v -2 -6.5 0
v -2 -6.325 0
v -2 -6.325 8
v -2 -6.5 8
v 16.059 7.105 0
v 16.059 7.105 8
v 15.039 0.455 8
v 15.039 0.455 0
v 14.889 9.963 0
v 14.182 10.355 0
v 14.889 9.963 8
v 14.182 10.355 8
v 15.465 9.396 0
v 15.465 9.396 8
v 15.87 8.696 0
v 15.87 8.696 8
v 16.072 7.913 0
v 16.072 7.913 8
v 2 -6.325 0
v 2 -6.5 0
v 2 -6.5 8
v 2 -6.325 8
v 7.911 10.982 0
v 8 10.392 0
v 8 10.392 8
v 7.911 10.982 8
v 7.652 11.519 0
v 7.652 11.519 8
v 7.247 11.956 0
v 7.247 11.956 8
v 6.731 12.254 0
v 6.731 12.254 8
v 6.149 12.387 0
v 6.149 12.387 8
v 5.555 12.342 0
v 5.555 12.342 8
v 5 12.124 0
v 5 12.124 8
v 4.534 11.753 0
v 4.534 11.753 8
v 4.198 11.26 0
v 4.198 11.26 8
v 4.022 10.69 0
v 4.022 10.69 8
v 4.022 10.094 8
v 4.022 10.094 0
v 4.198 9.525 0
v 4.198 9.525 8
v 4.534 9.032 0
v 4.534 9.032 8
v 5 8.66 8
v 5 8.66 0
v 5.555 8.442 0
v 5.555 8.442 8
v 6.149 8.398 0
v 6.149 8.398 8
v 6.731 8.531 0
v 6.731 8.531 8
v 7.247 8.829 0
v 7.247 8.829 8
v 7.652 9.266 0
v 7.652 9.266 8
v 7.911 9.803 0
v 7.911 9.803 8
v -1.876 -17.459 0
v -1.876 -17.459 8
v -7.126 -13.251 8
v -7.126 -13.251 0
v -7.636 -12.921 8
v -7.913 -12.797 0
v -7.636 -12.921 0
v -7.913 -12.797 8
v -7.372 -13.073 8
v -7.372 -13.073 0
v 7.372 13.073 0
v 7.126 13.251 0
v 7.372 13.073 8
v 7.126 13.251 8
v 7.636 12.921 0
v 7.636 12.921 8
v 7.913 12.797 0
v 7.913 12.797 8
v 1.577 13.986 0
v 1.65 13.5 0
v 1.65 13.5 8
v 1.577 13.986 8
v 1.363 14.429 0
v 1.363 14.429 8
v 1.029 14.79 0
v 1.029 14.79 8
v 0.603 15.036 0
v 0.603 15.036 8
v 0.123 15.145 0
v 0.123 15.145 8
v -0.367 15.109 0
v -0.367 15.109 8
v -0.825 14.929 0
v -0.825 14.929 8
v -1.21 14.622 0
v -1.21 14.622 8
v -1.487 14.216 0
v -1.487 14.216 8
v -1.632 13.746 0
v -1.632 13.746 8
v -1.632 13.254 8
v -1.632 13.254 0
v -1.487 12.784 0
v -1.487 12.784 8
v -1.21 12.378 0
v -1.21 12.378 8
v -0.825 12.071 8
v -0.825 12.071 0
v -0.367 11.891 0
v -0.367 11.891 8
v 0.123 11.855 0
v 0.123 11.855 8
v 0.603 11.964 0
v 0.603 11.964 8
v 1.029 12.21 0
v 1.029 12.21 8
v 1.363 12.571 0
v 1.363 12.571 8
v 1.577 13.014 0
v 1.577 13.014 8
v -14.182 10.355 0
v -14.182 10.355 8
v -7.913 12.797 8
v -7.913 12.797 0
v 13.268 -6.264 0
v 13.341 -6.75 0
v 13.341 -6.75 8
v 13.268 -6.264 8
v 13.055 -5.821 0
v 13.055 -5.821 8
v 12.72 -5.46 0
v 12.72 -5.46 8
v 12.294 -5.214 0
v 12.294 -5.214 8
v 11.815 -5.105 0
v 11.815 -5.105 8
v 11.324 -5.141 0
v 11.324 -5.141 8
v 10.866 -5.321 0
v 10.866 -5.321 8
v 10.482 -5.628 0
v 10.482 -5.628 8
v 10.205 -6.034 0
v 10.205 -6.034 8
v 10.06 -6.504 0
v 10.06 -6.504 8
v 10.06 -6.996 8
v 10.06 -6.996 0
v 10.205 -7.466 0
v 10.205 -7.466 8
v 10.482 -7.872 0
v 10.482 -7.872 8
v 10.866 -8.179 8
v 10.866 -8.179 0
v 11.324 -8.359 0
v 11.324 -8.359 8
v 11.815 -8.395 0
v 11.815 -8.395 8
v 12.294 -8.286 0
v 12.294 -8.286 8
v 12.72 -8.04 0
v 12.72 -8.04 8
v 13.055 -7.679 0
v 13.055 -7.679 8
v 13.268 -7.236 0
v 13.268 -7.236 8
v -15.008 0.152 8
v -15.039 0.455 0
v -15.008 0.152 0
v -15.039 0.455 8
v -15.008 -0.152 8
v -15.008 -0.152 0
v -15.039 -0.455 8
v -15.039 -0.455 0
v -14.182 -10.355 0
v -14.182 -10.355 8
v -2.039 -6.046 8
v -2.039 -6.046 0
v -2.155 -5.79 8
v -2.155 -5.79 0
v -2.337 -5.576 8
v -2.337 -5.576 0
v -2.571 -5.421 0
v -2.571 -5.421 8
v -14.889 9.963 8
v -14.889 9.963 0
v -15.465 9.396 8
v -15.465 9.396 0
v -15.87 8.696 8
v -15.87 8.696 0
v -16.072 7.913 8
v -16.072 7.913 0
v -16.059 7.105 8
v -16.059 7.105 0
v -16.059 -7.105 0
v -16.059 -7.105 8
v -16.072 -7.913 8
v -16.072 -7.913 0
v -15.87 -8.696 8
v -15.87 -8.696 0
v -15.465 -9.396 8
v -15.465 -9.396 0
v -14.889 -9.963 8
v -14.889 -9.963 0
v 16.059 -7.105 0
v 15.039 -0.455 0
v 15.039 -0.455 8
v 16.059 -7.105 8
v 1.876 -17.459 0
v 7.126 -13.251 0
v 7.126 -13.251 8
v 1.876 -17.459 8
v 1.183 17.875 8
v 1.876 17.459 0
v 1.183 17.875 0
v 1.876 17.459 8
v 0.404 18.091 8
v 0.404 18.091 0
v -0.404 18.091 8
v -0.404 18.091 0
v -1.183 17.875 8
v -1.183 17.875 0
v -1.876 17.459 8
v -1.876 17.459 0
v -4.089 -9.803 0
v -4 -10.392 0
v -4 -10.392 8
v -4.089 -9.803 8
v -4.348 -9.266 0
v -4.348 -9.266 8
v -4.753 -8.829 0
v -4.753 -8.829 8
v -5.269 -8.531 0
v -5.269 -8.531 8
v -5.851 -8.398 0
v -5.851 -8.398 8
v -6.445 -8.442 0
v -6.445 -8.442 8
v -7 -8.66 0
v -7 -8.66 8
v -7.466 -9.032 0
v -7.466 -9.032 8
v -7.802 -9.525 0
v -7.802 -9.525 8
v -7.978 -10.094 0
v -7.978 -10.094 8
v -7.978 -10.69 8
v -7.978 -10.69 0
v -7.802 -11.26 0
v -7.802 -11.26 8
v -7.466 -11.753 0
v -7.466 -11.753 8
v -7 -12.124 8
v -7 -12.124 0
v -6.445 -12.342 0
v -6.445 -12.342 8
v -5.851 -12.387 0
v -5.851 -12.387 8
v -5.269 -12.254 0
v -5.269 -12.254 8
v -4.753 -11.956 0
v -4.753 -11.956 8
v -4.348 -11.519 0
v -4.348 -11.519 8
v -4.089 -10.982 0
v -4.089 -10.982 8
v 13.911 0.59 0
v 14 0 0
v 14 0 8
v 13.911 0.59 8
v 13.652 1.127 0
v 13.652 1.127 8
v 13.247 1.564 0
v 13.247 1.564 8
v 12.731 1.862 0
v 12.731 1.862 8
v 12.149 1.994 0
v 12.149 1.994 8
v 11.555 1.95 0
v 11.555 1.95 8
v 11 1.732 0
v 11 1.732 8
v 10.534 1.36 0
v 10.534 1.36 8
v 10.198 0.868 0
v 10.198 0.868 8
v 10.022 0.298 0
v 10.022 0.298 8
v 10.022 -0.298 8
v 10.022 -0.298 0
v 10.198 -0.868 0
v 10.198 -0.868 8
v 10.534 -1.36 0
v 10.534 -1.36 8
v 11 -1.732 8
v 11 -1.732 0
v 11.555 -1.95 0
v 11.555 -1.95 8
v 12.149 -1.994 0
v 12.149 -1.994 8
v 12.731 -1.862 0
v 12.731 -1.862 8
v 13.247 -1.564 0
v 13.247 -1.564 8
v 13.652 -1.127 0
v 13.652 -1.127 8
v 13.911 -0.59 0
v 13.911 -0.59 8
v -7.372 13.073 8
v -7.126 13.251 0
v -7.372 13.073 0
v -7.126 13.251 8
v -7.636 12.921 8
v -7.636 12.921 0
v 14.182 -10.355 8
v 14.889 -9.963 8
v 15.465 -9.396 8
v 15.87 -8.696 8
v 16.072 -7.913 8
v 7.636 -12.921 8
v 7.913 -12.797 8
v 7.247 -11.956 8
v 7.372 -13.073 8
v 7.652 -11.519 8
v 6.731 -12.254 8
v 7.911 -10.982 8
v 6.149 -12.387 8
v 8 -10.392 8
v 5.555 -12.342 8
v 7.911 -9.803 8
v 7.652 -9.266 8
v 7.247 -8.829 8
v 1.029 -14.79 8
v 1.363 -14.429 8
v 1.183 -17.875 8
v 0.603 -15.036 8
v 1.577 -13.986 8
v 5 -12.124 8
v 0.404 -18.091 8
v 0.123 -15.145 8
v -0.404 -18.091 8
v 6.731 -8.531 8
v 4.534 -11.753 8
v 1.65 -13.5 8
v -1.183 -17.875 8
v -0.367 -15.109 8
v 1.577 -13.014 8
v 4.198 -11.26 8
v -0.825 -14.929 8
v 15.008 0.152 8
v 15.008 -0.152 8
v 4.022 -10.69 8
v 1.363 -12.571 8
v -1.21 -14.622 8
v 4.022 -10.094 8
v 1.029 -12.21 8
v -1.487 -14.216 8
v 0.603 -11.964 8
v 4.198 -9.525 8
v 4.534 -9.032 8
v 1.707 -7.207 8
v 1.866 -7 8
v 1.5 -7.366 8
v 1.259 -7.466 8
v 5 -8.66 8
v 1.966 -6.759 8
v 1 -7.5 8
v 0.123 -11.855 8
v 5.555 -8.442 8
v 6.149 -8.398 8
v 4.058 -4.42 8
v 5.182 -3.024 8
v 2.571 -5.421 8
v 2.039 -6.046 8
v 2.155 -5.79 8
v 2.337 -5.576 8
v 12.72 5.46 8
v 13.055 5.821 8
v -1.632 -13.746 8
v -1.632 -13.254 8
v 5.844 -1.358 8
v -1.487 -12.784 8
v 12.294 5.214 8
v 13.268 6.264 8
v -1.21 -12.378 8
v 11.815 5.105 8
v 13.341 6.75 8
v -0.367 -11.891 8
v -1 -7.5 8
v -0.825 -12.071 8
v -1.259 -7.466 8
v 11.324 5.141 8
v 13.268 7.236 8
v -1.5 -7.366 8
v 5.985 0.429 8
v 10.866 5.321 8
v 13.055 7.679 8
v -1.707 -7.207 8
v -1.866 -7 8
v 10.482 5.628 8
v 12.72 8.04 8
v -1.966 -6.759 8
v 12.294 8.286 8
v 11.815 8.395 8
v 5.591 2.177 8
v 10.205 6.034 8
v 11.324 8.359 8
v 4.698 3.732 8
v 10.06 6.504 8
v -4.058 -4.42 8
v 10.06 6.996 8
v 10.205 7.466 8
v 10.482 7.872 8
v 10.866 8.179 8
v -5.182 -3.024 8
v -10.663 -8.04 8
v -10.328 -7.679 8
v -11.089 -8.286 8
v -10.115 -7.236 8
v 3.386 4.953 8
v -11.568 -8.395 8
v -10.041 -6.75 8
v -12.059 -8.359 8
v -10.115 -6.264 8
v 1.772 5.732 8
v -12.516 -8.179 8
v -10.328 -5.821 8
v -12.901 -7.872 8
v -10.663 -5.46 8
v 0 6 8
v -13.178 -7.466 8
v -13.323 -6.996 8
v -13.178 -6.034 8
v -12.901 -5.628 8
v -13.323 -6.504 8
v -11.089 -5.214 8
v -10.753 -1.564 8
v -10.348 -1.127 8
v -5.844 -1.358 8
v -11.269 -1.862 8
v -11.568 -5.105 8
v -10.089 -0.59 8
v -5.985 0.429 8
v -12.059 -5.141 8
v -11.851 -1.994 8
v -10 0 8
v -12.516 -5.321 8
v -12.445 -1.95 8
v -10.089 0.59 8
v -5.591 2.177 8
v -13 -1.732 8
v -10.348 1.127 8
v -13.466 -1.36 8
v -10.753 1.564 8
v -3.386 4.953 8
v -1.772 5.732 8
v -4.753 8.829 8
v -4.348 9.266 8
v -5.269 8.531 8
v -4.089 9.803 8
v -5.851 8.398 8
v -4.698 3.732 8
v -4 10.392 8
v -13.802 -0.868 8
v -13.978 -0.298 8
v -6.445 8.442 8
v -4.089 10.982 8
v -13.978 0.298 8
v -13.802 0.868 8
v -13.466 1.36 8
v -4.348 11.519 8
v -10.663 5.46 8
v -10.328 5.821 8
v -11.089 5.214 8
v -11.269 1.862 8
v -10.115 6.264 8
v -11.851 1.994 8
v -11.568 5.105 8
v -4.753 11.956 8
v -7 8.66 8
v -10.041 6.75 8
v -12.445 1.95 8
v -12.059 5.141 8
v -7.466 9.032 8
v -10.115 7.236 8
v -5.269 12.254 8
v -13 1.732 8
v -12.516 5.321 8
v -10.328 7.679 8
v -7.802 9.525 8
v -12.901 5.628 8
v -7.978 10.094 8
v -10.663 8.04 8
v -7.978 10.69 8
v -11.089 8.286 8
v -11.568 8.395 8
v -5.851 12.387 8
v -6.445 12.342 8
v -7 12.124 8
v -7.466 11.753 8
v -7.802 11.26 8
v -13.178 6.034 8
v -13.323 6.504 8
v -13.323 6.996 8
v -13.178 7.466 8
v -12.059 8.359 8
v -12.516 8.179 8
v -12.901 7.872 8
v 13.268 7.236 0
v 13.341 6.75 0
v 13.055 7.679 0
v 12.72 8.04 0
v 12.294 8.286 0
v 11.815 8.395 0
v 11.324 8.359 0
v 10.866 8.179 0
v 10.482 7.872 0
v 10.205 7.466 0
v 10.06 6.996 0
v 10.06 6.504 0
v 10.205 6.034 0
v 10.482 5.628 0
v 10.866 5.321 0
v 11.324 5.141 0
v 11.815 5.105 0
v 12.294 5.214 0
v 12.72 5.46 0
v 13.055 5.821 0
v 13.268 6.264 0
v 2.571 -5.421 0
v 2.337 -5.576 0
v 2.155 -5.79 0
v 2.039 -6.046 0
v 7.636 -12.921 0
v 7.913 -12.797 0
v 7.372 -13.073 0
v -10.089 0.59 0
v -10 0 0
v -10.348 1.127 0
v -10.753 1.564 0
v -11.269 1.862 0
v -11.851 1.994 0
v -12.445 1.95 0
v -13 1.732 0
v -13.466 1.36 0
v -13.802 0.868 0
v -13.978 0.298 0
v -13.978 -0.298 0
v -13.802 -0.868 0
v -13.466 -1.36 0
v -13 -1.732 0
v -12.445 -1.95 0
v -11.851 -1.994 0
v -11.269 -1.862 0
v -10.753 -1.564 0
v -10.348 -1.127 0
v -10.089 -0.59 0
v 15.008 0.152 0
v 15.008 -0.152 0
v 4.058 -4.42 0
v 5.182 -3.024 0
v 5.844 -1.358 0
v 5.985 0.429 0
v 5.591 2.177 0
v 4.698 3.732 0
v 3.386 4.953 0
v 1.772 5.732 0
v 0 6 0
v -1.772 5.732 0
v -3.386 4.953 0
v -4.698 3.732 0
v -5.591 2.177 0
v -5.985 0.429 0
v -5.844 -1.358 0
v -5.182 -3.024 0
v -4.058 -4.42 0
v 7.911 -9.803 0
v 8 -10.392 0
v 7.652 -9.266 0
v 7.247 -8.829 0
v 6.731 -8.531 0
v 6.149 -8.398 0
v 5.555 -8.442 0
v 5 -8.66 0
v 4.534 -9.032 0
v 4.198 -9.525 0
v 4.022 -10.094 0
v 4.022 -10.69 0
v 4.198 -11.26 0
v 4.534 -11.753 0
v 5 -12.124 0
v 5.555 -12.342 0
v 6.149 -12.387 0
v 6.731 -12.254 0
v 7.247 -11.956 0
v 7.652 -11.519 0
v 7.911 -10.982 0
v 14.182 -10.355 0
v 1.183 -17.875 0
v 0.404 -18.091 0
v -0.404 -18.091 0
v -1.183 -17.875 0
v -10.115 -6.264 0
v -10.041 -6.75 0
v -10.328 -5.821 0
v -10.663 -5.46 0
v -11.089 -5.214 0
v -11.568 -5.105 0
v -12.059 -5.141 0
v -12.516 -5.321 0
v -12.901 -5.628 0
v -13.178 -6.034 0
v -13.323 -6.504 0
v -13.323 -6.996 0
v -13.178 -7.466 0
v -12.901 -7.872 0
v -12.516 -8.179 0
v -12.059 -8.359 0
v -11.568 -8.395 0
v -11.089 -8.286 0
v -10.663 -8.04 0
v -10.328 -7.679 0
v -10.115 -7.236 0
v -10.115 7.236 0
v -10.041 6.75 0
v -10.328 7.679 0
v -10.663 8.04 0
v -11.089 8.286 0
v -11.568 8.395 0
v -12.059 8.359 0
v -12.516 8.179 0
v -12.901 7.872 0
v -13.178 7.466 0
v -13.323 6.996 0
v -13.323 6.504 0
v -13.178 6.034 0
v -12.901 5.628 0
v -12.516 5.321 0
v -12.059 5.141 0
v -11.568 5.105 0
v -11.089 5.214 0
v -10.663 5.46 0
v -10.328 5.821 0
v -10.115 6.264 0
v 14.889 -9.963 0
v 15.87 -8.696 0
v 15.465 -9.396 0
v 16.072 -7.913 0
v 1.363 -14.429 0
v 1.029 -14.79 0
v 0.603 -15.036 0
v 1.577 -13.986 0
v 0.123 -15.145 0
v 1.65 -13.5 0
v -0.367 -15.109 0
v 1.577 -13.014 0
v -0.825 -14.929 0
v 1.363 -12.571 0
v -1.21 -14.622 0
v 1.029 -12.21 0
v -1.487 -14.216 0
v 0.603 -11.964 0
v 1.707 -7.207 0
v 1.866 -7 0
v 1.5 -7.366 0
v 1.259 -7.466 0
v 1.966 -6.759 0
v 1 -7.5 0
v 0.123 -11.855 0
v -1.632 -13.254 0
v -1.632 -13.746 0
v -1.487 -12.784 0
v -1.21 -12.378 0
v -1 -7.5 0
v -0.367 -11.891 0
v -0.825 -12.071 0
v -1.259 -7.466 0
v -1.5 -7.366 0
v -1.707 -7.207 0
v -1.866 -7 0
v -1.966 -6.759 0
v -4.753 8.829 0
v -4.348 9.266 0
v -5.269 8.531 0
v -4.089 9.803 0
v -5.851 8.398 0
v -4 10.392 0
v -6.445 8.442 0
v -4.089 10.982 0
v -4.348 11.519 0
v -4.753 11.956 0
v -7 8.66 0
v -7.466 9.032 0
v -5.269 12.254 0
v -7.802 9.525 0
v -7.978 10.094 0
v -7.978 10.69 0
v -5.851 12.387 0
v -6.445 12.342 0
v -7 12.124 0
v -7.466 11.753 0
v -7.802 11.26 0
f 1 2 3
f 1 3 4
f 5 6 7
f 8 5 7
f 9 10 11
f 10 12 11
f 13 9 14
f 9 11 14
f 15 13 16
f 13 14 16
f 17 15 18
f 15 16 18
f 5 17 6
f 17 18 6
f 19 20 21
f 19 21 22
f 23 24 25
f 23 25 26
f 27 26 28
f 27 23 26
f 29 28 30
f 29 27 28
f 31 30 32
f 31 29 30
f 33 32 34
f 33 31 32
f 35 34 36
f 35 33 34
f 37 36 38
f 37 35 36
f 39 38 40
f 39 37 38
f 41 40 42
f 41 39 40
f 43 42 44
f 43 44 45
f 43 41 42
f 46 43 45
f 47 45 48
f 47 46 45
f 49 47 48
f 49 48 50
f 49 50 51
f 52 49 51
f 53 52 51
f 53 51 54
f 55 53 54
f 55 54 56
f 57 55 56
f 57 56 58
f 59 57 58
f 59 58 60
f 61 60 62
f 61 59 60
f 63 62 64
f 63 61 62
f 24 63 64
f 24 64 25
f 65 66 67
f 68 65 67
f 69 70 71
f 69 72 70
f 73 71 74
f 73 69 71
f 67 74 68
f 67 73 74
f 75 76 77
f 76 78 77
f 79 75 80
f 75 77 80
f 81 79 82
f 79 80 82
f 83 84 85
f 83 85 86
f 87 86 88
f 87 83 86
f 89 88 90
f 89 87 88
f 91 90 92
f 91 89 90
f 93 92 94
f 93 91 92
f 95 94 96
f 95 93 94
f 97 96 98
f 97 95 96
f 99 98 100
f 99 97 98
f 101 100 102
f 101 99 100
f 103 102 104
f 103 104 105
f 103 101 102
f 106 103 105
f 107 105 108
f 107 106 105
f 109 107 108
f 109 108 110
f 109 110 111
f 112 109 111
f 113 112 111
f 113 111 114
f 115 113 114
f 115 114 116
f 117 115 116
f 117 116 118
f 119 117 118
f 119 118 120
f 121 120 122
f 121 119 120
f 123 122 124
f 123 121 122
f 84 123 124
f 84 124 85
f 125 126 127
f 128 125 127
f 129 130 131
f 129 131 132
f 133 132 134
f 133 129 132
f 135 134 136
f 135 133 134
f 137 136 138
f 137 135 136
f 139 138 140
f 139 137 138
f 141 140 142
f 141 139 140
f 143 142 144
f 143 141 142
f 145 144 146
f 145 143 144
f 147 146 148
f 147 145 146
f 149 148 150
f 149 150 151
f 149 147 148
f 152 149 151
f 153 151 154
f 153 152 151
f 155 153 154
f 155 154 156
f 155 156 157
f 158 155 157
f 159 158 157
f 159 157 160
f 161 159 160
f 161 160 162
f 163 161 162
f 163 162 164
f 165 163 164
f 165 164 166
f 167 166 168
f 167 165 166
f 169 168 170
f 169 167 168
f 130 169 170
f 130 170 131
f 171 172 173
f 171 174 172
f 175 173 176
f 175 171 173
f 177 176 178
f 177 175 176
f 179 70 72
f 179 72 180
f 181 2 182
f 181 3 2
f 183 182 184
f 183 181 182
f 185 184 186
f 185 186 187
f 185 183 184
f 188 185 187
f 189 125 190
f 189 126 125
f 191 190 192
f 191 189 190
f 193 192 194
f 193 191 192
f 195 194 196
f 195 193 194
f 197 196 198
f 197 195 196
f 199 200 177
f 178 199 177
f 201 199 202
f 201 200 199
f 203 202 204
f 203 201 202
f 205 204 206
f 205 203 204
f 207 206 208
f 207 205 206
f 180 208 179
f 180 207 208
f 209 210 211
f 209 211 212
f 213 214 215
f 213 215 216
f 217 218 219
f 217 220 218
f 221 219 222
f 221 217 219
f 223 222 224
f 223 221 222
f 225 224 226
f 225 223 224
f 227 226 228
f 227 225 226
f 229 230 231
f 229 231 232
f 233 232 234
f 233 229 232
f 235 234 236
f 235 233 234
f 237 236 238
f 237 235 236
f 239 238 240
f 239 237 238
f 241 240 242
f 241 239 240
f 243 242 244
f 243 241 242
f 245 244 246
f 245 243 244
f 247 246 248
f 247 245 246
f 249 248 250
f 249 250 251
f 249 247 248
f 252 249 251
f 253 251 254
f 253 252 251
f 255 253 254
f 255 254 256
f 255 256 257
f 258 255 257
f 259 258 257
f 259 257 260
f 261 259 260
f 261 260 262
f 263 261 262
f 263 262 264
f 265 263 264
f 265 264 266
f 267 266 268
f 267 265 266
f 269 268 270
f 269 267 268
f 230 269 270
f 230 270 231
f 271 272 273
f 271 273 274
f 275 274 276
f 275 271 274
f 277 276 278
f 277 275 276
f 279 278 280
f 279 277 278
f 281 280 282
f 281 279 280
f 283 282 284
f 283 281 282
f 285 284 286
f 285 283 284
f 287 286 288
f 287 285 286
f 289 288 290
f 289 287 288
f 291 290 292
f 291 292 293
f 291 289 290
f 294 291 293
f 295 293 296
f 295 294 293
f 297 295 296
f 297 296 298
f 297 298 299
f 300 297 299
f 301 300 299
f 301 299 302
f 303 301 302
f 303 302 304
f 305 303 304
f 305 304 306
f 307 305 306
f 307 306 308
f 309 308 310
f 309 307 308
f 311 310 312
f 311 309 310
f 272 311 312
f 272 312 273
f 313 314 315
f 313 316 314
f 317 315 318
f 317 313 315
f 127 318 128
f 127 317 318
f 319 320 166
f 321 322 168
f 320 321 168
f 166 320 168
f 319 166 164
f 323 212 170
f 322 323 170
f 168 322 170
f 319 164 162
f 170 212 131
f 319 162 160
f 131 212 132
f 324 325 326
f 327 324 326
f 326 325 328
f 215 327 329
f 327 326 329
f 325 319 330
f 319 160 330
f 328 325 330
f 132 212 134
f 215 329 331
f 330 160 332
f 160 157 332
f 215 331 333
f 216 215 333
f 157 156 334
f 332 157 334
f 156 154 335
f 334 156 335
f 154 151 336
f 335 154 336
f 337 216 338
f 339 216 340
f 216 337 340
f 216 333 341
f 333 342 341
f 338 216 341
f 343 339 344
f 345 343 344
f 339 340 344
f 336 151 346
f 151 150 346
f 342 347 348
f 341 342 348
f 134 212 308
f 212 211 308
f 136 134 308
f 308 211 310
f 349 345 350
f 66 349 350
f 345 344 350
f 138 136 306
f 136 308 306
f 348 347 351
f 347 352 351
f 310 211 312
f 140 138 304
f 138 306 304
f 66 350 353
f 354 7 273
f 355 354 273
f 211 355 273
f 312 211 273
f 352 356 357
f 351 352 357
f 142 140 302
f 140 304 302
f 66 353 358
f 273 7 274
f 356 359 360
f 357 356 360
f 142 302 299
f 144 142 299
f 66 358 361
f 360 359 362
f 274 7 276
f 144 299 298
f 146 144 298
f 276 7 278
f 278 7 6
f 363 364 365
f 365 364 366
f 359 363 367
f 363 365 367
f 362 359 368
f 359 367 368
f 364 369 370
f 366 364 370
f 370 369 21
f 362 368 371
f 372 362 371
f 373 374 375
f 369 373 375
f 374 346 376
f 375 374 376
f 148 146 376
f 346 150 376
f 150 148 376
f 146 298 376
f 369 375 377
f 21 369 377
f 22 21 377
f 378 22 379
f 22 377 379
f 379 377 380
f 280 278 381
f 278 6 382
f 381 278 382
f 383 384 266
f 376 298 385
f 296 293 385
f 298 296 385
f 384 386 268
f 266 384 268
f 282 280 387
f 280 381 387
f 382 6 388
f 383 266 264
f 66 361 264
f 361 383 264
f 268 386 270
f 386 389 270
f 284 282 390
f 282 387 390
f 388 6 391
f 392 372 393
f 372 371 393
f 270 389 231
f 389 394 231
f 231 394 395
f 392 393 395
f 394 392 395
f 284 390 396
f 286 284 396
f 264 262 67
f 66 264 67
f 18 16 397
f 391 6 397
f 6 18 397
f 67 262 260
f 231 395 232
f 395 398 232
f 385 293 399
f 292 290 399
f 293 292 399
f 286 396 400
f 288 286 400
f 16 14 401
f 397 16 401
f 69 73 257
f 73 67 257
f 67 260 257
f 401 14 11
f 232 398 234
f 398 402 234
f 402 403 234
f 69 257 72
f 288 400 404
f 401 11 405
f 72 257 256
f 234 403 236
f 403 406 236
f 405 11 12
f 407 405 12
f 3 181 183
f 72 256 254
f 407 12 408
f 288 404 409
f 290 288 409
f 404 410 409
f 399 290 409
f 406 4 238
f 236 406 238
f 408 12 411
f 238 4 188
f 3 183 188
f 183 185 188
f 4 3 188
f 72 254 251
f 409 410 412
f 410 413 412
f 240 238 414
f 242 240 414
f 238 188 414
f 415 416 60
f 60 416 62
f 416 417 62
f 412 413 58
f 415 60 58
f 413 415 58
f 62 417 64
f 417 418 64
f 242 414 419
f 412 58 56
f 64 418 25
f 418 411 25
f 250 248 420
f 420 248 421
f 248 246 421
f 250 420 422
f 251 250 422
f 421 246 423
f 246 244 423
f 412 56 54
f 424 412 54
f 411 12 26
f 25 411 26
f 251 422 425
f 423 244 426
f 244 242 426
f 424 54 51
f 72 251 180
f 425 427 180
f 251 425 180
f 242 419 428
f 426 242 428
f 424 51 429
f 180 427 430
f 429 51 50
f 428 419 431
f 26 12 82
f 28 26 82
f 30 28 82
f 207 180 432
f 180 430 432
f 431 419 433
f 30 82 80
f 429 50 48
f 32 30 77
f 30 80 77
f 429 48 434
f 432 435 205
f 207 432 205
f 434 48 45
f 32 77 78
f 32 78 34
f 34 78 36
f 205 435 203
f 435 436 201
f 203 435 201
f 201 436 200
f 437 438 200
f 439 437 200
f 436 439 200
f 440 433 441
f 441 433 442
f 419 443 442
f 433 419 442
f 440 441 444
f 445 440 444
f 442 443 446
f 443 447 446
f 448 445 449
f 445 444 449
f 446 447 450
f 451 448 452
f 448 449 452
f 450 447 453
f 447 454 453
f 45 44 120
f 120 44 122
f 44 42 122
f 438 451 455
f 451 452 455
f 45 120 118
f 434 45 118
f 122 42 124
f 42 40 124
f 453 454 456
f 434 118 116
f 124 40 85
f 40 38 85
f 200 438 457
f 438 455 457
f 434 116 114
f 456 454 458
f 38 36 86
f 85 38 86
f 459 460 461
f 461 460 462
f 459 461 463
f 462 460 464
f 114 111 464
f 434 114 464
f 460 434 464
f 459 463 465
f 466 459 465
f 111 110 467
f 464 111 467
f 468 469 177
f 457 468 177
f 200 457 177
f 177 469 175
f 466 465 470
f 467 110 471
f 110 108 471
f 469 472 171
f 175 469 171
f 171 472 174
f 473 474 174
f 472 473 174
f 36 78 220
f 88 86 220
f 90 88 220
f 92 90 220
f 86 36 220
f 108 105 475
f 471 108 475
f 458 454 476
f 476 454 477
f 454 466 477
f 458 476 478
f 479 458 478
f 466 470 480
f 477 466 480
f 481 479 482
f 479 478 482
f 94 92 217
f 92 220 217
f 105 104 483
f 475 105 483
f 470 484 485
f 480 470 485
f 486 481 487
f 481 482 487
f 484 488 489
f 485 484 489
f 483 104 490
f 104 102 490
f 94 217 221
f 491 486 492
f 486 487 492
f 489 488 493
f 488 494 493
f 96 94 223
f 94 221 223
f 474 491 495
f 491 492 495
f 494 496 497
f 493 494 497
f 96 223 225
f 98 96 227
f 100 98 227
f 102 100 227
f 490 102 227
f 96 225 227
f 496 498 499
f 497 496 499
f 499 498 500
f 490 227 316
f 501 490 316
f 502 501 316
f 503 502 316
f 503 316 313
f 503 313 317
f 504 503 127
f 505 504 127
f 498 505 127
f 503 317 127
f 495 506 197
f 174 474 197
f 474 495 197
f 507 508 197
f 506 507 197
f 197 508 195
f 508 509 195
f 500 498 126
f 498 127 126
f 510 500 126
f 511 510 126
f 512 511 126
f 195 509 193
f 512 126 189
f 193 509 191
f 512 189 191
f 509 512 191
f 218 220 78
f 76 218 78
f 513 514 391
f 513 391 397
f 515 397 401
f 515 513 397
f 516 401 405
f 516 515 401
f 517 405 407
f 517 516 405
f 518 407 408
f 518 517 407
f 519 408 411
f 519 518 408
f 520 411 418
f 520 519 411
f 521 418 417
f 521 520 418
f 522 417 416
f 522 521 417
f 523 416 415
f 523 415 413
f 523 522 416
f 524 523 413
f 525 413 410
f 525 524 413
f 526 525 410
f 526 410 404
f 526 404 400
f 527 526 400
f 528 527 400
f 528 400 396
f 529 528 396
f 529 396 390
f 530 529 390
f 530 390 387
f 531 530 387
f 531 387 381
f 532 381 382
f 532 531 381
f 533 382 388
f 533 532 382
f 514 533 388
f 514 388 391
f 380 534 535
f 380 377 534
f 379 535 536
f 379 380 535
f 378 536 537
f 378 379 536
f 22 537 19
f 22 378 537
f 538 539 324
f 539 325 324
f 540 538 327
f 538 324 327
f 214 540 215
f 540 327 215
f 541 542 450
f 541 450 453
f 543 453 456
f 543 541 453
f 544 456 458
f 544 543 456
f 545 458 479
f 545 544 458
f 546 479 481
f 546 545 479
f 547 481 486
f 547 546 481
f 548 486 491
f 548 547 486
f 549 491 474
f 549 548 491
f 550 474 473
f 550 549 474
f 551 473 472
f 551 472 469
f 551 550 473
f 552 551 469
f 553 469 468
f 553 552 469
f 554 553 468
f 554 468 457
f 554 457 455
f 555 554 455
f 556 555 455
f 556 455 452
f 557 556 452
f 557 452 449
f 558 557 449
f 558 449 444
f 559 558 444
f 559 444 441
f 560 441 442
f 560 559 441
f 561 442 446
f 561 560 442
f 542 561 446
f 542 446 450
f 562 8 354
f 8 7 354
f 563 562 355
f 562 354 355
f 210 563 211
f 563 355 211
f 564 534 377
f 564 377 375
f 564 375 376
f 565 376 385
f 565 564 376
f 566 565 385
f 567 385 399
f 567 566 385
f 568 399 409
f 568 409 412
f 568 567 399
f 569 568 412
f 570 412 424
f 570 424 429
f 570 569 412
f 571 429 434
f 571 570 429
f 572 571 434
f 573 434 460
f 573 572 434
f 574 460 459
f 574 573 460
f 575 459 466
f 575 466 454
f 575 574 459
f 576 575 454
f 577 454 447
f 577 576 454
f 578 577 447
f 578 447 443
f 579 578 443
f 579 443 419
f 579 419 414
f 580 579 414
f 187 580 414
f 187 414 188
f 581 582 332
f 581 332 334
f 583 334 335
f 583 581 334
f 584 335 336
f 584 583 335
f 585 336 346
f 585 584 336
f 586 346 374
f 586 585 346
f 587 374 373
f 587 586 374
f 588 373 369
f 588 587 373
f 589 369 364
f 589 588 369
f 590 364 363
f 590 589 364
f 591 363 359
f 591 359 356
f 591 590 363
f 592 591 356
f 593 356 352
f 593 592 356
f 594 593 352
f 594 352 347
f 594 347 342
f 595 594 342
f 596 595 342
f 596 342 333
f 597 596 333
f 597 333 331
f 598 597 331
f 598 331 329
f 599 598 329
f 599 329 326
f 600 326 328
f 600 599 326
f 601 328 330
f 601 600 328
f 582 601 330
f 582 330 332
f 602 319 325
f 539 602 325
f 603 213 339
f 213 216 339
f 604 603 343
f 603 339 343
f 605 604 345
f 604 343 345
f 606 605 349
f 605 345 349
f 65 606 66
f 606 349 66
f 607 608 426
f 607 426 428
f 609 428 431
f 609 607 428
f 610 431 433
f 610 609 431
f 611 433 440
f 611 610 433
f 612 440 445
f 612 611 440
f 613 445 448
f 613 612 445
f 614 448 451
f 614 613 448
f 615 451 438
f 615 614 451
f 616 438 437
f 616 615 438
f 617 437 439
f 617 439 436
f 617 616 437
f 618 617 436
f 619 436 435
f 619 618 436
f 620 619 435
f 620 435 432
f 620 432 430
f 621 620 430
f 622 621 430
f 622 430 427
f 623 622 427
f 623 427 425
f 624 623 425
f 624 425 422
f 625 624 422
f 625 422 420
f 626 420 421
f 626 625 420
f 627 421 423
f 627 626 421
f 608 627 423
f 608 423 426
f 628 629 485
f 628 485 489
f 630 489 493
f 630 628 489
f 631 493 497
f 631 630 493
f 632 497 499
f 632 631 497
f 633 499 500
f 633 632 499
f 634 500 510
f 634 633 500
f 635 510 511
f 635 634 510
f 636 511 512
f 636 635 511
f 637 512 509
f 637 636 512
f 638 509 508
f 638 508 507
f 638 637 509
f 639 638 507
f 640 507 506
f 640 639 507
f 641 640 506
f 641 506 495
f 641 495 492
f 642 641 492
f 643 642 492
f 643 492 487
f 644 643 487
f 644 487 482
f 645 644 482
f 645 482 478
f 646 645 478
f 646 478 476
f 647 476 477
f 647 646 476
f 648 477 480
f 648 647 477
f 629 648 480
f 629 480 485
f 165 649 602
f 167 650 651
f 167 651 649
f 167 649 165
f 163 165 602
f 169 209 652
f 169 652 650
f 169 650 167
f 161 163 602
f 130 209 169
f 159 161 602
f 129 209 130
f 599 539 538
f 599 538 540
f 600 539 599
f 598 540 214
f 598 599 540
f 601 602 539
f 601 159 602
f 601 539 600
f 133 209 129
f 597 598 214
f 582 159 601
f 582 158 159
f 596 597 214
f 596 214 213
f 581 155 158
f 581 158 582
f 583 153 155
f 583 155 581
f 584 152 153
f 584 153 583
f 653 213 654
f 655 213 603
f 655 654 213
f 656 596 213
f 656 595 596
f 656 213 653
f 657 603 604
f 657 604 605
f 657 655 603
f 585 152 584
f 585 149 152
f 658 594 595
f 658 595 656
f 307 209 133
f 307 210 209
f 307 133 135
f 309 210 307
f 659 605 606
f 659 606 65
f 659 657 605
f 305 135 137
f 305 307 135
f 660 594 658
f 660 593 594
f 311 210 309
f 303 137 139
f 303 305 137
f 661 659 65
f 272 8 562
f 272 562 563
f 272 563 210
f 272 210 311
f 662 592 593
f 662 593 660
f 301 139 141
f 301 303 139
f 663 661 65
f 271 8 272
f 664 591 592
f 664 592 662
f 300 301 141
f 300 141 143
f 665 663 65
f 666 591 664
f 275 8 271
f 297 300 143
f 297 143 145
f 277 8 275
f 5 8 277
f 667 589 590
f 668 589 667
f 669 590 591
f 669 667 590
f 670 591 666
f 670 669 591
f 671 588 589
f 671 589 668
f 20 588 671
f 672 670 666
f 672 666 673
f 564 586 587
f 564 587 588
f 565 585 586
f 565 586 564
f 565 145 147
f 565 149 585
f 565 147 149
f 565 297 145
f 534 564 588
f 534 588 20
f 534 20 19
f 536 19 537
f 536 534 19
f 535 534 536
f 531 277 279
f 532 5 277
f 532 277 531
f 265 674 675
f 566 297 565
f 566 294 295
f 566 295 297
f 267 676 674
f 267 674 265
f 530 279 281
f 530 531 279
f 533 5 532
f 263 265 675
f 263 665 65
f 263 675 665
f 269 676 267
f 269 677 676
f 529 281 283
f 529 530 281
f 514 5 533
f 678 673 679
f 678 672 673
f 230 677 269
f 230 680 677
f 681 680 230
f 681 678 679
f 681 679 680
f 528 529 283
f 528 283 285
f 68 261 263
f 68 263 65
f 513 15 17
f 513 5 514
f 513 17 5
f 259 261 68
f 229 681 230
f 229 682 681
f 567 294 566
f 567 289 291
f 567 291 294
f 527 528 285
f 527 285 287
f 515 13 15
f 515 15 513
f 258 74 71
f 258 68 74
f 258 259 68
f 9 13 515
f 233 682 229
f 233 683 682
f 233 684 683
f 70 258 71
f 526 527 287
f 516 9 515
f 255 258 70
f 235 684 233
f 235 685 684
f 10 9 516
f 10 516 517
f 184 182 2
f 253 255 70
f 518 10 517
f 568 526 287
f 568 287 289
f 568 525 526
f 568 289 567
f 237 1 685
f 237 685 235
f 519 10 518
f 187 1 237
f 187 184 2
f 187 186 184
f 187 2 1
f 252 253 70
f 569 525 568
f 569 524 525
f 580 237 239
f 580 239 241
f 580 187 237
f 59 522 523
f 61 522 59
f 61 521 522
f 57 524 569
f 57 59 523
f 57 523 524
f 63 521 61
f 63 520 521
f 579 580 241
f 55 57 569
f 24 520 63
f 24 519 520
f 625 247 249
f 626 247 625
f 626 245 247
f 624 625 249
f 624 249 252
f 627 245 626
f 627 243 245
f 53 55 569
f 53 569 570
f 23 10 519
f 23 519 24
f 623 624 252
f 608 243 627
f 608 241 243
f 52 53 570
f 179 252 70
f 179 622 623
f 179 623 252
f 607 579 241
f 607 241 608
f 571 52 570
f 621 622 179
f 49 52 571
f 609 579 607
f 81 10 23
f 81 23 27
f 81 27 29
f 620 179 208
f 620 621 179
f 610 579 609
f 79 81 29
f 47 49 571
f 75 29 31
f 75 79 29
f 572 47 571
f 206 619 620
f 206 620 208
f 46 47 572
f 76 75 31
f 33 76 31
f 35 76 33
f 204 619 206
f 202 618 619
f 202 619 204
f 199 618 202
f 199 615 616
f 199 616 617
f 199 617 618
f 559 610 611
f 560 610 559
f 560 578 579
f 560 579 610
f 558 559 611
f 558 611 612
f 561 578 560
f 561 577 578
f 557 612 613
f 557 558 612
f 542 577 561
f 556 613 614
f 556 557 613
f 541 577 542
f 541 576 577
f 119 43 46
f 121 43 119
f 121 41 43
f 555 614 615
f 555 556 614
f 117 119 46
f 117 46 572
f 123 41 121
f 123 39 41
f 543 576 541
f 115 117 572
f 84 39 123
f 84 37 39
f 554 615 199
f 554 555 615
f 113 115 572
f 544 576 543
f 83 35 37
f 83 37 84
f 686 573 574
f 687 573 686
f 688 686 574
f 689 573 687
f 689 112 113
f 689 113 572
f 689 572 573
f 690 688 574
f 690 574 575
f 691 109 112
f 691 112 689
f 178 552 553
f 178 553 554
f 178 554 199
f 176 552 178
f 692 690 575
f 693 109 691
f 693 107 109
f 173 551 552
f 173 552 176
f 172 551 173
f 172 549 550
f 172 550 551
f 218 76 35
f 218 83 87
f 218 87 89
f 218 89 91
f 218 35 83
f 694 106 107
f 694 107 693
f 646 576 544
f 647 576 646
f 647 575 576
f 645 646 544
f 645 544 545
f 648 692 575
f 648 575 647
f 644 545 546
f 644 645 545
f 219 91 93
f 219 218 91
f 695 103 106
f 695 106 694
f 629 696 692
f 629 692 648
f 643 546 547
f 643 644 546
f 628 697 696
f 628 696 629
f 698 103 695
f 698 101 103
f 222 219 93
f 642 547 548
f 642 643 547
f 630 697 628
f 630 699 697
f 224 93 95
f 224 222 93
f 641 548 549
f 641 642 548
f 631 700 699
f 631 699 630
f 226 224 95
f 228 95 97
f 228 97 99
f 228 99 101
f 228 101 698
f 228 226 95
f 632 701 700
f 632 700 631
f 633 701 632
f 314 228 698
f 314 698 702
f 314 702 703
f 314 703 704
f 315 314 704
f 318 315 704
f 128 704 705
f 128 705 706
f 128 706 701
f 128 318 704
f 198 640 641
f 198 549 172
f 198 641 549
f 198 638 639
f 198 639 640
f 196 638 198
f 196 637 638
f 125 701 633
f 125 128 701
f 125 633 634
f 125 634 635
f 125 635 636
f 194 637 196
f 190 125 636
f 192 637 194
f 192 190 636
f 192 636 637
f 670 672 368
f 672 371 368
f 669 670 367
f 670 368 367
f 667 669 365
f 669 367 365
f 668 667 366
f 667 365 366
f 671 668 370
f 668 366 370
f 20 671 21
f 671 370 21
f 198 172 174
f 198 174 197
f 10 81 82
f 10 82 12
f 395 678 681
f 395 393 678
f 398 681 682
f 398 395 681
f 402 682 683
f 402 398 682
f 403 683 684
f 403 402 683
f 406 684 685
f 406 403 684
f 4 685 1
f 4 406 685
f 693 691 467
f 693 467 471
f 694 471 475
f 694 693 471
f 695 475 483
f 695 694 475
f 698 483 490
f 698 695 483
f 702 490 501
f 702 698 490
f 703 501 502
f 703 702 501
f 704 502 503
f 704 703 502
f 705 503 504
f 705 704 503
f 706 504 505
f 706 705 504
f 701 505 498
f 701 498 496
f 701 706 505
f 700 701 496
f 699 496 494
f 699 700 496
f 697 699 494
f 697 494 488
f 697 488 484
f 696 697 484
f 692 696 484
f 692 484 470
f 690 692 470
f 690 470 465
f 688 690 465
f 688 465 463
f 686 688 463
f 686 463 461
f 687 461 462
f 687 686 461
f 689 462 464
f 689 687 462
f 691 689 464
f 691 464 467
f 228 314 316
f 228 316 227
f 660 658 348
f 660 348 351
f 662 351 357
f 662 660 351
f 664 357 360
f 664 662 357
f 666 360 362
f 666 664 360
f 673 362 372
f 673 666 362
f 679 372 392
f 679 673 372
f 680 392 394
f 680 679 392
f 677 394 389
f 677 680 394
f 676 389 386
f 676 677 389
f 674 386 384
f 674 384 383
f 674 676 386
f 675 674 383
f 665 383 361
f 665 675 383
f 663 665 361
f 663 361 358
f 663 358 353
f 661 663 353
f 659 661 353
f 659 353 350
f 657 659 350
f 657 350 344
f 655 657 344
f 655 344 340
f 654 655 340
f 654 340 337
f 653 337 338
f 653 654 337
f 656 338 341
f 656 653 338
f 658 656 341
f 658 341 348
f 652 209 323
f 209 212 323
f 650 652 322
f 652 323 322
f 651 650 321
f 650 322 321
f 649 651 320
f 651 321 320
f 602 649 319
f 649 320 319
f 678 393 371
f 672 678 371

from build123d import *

# Parameters (mm, degrees)
SKETCH_2_R      = 1.65
SKETCH_2_R_2    = 2
EXTRUDE_1_DEPTH = 8
FILLET_1_R      = 3
FILLET_2_R      = 1


with BuildPart() as part:
    # 草图2 → 凸台-拉伸1 (new body)
    with BuildSketch(Plane.XY):
        Polygon((0, 18.963672443), (7.484579775, 12.963672443), (16.423022085, 9.481836222), (14.96915955, 0), (16.423022085, -9.481836222), (7.484579775, -12.963672443), (0, -18.963672443), (-7.484579775, -12.963672443), (-16.423022085, -9.481836222), (-14.96915955, 0), (-16.423022085, 9.481836222), (-7.484579775, 12.963672443), align=None)
        with Locations((0, 13.5)):
            Circle(SKETCH_2_R, mode=Mode.SUBTRACT)
        with Locations((11.691342951, 6.75)):
            Circle(SKETCH_2_R, mode=Mode.SUBTRACT)
        with Locations((11.691342951, -6.75)):
            Circle(SKETCH_2_R, mode=Mode.SUBTRACT)
        with Locations((0, -13.5)):
            Circle(SKETCH_2_R, mode=Mode.SUBTRACT)
        with Locations((-11.691342951, -6.75)):
            Circle(SKETCH_2_R, mode=Mode.SUBTRACT)
        with Locations((-11.691342951, 6.75)):
            Circle(SKETCH_2_R, mode=Mode.SUBTRACT)
        with Locations((6, 10.392304845)):
            Circle(SKETCH_2_R_2, mode=Mode.SUBTRACT)
        with Locations((12, 0)):
            Circle(SKETCH_2_R_2, mode=Mode.SUBTRACT)
        with Locations((6, -10.392304845)):
            Circle(SKETCH_2_R_2, mode=Mode.SUBTRACT)
        with Locations((-6, -10.392304845)):
            Circle(SKETCH_2_R_2, mode=Mode.SUBTRACT)
        with Locations((-12, 0)):
            Circle(SKETCH_2_R_2, mode=Mode.SUBTRACT)
        with Locations((-6, 10.392304845)):
            Circle(SKETCH_2_R_2, mode=Mode.SUBTRACT)
        with BuildLine():
            Line((0, -7.5), (2, -7.5))
            Line((2, -7.5), (2, -5.656854249))
            ThreePointArc((2, -5.656854249), (0, 6), (-2, -5.656854249))
            Line((-2, -5.656854249), (-2, -7.5))
            Line((-2, -7.5), (0, -7.5))
        make_face(mode=Mode.SUBTRACT)
    extrude(amount=EXTRUDE_1_DEPTH)

    # 圆角1
    fillet_1_edges = [part.edges().sort_by_distance(p)[0] for p in [
        (0, 18.963672443, 4),
        (7.484579775, 12.963672443, 4),
        (16.423022085, 9.481836222, 4),
        (14.96915955, 0, 4),
        (16.423022085, -9.481836222, 4),
        (7.484579775, -12.963672443, 4),
        (0, -18.963672443, 4),
        (-7.484579775, -12.963672443, 4),
        (-16.423022085, -9.481836222, 4),
        (-14.96915955, 0, 4),
        (-16.423022085, 9.481836222, 4),
        (-7.484579775, 12.963672443, 4),
    ]]
    fillet(fillet_1_edges, radius=FILLET_1_R)

    # 圆角2
    fillet_2_edges = [part.edges().sort_by_distance(p)[0] for p in [
        (-2, -7.5, 4),
        (2, -7.5, 4),
        (2, -5.656854249, 4),
        (-2, -5.656854249, 4),
    ]]
    fillet(fillet_2_edges, radius=FILLET_2_R)


solid = part.part
